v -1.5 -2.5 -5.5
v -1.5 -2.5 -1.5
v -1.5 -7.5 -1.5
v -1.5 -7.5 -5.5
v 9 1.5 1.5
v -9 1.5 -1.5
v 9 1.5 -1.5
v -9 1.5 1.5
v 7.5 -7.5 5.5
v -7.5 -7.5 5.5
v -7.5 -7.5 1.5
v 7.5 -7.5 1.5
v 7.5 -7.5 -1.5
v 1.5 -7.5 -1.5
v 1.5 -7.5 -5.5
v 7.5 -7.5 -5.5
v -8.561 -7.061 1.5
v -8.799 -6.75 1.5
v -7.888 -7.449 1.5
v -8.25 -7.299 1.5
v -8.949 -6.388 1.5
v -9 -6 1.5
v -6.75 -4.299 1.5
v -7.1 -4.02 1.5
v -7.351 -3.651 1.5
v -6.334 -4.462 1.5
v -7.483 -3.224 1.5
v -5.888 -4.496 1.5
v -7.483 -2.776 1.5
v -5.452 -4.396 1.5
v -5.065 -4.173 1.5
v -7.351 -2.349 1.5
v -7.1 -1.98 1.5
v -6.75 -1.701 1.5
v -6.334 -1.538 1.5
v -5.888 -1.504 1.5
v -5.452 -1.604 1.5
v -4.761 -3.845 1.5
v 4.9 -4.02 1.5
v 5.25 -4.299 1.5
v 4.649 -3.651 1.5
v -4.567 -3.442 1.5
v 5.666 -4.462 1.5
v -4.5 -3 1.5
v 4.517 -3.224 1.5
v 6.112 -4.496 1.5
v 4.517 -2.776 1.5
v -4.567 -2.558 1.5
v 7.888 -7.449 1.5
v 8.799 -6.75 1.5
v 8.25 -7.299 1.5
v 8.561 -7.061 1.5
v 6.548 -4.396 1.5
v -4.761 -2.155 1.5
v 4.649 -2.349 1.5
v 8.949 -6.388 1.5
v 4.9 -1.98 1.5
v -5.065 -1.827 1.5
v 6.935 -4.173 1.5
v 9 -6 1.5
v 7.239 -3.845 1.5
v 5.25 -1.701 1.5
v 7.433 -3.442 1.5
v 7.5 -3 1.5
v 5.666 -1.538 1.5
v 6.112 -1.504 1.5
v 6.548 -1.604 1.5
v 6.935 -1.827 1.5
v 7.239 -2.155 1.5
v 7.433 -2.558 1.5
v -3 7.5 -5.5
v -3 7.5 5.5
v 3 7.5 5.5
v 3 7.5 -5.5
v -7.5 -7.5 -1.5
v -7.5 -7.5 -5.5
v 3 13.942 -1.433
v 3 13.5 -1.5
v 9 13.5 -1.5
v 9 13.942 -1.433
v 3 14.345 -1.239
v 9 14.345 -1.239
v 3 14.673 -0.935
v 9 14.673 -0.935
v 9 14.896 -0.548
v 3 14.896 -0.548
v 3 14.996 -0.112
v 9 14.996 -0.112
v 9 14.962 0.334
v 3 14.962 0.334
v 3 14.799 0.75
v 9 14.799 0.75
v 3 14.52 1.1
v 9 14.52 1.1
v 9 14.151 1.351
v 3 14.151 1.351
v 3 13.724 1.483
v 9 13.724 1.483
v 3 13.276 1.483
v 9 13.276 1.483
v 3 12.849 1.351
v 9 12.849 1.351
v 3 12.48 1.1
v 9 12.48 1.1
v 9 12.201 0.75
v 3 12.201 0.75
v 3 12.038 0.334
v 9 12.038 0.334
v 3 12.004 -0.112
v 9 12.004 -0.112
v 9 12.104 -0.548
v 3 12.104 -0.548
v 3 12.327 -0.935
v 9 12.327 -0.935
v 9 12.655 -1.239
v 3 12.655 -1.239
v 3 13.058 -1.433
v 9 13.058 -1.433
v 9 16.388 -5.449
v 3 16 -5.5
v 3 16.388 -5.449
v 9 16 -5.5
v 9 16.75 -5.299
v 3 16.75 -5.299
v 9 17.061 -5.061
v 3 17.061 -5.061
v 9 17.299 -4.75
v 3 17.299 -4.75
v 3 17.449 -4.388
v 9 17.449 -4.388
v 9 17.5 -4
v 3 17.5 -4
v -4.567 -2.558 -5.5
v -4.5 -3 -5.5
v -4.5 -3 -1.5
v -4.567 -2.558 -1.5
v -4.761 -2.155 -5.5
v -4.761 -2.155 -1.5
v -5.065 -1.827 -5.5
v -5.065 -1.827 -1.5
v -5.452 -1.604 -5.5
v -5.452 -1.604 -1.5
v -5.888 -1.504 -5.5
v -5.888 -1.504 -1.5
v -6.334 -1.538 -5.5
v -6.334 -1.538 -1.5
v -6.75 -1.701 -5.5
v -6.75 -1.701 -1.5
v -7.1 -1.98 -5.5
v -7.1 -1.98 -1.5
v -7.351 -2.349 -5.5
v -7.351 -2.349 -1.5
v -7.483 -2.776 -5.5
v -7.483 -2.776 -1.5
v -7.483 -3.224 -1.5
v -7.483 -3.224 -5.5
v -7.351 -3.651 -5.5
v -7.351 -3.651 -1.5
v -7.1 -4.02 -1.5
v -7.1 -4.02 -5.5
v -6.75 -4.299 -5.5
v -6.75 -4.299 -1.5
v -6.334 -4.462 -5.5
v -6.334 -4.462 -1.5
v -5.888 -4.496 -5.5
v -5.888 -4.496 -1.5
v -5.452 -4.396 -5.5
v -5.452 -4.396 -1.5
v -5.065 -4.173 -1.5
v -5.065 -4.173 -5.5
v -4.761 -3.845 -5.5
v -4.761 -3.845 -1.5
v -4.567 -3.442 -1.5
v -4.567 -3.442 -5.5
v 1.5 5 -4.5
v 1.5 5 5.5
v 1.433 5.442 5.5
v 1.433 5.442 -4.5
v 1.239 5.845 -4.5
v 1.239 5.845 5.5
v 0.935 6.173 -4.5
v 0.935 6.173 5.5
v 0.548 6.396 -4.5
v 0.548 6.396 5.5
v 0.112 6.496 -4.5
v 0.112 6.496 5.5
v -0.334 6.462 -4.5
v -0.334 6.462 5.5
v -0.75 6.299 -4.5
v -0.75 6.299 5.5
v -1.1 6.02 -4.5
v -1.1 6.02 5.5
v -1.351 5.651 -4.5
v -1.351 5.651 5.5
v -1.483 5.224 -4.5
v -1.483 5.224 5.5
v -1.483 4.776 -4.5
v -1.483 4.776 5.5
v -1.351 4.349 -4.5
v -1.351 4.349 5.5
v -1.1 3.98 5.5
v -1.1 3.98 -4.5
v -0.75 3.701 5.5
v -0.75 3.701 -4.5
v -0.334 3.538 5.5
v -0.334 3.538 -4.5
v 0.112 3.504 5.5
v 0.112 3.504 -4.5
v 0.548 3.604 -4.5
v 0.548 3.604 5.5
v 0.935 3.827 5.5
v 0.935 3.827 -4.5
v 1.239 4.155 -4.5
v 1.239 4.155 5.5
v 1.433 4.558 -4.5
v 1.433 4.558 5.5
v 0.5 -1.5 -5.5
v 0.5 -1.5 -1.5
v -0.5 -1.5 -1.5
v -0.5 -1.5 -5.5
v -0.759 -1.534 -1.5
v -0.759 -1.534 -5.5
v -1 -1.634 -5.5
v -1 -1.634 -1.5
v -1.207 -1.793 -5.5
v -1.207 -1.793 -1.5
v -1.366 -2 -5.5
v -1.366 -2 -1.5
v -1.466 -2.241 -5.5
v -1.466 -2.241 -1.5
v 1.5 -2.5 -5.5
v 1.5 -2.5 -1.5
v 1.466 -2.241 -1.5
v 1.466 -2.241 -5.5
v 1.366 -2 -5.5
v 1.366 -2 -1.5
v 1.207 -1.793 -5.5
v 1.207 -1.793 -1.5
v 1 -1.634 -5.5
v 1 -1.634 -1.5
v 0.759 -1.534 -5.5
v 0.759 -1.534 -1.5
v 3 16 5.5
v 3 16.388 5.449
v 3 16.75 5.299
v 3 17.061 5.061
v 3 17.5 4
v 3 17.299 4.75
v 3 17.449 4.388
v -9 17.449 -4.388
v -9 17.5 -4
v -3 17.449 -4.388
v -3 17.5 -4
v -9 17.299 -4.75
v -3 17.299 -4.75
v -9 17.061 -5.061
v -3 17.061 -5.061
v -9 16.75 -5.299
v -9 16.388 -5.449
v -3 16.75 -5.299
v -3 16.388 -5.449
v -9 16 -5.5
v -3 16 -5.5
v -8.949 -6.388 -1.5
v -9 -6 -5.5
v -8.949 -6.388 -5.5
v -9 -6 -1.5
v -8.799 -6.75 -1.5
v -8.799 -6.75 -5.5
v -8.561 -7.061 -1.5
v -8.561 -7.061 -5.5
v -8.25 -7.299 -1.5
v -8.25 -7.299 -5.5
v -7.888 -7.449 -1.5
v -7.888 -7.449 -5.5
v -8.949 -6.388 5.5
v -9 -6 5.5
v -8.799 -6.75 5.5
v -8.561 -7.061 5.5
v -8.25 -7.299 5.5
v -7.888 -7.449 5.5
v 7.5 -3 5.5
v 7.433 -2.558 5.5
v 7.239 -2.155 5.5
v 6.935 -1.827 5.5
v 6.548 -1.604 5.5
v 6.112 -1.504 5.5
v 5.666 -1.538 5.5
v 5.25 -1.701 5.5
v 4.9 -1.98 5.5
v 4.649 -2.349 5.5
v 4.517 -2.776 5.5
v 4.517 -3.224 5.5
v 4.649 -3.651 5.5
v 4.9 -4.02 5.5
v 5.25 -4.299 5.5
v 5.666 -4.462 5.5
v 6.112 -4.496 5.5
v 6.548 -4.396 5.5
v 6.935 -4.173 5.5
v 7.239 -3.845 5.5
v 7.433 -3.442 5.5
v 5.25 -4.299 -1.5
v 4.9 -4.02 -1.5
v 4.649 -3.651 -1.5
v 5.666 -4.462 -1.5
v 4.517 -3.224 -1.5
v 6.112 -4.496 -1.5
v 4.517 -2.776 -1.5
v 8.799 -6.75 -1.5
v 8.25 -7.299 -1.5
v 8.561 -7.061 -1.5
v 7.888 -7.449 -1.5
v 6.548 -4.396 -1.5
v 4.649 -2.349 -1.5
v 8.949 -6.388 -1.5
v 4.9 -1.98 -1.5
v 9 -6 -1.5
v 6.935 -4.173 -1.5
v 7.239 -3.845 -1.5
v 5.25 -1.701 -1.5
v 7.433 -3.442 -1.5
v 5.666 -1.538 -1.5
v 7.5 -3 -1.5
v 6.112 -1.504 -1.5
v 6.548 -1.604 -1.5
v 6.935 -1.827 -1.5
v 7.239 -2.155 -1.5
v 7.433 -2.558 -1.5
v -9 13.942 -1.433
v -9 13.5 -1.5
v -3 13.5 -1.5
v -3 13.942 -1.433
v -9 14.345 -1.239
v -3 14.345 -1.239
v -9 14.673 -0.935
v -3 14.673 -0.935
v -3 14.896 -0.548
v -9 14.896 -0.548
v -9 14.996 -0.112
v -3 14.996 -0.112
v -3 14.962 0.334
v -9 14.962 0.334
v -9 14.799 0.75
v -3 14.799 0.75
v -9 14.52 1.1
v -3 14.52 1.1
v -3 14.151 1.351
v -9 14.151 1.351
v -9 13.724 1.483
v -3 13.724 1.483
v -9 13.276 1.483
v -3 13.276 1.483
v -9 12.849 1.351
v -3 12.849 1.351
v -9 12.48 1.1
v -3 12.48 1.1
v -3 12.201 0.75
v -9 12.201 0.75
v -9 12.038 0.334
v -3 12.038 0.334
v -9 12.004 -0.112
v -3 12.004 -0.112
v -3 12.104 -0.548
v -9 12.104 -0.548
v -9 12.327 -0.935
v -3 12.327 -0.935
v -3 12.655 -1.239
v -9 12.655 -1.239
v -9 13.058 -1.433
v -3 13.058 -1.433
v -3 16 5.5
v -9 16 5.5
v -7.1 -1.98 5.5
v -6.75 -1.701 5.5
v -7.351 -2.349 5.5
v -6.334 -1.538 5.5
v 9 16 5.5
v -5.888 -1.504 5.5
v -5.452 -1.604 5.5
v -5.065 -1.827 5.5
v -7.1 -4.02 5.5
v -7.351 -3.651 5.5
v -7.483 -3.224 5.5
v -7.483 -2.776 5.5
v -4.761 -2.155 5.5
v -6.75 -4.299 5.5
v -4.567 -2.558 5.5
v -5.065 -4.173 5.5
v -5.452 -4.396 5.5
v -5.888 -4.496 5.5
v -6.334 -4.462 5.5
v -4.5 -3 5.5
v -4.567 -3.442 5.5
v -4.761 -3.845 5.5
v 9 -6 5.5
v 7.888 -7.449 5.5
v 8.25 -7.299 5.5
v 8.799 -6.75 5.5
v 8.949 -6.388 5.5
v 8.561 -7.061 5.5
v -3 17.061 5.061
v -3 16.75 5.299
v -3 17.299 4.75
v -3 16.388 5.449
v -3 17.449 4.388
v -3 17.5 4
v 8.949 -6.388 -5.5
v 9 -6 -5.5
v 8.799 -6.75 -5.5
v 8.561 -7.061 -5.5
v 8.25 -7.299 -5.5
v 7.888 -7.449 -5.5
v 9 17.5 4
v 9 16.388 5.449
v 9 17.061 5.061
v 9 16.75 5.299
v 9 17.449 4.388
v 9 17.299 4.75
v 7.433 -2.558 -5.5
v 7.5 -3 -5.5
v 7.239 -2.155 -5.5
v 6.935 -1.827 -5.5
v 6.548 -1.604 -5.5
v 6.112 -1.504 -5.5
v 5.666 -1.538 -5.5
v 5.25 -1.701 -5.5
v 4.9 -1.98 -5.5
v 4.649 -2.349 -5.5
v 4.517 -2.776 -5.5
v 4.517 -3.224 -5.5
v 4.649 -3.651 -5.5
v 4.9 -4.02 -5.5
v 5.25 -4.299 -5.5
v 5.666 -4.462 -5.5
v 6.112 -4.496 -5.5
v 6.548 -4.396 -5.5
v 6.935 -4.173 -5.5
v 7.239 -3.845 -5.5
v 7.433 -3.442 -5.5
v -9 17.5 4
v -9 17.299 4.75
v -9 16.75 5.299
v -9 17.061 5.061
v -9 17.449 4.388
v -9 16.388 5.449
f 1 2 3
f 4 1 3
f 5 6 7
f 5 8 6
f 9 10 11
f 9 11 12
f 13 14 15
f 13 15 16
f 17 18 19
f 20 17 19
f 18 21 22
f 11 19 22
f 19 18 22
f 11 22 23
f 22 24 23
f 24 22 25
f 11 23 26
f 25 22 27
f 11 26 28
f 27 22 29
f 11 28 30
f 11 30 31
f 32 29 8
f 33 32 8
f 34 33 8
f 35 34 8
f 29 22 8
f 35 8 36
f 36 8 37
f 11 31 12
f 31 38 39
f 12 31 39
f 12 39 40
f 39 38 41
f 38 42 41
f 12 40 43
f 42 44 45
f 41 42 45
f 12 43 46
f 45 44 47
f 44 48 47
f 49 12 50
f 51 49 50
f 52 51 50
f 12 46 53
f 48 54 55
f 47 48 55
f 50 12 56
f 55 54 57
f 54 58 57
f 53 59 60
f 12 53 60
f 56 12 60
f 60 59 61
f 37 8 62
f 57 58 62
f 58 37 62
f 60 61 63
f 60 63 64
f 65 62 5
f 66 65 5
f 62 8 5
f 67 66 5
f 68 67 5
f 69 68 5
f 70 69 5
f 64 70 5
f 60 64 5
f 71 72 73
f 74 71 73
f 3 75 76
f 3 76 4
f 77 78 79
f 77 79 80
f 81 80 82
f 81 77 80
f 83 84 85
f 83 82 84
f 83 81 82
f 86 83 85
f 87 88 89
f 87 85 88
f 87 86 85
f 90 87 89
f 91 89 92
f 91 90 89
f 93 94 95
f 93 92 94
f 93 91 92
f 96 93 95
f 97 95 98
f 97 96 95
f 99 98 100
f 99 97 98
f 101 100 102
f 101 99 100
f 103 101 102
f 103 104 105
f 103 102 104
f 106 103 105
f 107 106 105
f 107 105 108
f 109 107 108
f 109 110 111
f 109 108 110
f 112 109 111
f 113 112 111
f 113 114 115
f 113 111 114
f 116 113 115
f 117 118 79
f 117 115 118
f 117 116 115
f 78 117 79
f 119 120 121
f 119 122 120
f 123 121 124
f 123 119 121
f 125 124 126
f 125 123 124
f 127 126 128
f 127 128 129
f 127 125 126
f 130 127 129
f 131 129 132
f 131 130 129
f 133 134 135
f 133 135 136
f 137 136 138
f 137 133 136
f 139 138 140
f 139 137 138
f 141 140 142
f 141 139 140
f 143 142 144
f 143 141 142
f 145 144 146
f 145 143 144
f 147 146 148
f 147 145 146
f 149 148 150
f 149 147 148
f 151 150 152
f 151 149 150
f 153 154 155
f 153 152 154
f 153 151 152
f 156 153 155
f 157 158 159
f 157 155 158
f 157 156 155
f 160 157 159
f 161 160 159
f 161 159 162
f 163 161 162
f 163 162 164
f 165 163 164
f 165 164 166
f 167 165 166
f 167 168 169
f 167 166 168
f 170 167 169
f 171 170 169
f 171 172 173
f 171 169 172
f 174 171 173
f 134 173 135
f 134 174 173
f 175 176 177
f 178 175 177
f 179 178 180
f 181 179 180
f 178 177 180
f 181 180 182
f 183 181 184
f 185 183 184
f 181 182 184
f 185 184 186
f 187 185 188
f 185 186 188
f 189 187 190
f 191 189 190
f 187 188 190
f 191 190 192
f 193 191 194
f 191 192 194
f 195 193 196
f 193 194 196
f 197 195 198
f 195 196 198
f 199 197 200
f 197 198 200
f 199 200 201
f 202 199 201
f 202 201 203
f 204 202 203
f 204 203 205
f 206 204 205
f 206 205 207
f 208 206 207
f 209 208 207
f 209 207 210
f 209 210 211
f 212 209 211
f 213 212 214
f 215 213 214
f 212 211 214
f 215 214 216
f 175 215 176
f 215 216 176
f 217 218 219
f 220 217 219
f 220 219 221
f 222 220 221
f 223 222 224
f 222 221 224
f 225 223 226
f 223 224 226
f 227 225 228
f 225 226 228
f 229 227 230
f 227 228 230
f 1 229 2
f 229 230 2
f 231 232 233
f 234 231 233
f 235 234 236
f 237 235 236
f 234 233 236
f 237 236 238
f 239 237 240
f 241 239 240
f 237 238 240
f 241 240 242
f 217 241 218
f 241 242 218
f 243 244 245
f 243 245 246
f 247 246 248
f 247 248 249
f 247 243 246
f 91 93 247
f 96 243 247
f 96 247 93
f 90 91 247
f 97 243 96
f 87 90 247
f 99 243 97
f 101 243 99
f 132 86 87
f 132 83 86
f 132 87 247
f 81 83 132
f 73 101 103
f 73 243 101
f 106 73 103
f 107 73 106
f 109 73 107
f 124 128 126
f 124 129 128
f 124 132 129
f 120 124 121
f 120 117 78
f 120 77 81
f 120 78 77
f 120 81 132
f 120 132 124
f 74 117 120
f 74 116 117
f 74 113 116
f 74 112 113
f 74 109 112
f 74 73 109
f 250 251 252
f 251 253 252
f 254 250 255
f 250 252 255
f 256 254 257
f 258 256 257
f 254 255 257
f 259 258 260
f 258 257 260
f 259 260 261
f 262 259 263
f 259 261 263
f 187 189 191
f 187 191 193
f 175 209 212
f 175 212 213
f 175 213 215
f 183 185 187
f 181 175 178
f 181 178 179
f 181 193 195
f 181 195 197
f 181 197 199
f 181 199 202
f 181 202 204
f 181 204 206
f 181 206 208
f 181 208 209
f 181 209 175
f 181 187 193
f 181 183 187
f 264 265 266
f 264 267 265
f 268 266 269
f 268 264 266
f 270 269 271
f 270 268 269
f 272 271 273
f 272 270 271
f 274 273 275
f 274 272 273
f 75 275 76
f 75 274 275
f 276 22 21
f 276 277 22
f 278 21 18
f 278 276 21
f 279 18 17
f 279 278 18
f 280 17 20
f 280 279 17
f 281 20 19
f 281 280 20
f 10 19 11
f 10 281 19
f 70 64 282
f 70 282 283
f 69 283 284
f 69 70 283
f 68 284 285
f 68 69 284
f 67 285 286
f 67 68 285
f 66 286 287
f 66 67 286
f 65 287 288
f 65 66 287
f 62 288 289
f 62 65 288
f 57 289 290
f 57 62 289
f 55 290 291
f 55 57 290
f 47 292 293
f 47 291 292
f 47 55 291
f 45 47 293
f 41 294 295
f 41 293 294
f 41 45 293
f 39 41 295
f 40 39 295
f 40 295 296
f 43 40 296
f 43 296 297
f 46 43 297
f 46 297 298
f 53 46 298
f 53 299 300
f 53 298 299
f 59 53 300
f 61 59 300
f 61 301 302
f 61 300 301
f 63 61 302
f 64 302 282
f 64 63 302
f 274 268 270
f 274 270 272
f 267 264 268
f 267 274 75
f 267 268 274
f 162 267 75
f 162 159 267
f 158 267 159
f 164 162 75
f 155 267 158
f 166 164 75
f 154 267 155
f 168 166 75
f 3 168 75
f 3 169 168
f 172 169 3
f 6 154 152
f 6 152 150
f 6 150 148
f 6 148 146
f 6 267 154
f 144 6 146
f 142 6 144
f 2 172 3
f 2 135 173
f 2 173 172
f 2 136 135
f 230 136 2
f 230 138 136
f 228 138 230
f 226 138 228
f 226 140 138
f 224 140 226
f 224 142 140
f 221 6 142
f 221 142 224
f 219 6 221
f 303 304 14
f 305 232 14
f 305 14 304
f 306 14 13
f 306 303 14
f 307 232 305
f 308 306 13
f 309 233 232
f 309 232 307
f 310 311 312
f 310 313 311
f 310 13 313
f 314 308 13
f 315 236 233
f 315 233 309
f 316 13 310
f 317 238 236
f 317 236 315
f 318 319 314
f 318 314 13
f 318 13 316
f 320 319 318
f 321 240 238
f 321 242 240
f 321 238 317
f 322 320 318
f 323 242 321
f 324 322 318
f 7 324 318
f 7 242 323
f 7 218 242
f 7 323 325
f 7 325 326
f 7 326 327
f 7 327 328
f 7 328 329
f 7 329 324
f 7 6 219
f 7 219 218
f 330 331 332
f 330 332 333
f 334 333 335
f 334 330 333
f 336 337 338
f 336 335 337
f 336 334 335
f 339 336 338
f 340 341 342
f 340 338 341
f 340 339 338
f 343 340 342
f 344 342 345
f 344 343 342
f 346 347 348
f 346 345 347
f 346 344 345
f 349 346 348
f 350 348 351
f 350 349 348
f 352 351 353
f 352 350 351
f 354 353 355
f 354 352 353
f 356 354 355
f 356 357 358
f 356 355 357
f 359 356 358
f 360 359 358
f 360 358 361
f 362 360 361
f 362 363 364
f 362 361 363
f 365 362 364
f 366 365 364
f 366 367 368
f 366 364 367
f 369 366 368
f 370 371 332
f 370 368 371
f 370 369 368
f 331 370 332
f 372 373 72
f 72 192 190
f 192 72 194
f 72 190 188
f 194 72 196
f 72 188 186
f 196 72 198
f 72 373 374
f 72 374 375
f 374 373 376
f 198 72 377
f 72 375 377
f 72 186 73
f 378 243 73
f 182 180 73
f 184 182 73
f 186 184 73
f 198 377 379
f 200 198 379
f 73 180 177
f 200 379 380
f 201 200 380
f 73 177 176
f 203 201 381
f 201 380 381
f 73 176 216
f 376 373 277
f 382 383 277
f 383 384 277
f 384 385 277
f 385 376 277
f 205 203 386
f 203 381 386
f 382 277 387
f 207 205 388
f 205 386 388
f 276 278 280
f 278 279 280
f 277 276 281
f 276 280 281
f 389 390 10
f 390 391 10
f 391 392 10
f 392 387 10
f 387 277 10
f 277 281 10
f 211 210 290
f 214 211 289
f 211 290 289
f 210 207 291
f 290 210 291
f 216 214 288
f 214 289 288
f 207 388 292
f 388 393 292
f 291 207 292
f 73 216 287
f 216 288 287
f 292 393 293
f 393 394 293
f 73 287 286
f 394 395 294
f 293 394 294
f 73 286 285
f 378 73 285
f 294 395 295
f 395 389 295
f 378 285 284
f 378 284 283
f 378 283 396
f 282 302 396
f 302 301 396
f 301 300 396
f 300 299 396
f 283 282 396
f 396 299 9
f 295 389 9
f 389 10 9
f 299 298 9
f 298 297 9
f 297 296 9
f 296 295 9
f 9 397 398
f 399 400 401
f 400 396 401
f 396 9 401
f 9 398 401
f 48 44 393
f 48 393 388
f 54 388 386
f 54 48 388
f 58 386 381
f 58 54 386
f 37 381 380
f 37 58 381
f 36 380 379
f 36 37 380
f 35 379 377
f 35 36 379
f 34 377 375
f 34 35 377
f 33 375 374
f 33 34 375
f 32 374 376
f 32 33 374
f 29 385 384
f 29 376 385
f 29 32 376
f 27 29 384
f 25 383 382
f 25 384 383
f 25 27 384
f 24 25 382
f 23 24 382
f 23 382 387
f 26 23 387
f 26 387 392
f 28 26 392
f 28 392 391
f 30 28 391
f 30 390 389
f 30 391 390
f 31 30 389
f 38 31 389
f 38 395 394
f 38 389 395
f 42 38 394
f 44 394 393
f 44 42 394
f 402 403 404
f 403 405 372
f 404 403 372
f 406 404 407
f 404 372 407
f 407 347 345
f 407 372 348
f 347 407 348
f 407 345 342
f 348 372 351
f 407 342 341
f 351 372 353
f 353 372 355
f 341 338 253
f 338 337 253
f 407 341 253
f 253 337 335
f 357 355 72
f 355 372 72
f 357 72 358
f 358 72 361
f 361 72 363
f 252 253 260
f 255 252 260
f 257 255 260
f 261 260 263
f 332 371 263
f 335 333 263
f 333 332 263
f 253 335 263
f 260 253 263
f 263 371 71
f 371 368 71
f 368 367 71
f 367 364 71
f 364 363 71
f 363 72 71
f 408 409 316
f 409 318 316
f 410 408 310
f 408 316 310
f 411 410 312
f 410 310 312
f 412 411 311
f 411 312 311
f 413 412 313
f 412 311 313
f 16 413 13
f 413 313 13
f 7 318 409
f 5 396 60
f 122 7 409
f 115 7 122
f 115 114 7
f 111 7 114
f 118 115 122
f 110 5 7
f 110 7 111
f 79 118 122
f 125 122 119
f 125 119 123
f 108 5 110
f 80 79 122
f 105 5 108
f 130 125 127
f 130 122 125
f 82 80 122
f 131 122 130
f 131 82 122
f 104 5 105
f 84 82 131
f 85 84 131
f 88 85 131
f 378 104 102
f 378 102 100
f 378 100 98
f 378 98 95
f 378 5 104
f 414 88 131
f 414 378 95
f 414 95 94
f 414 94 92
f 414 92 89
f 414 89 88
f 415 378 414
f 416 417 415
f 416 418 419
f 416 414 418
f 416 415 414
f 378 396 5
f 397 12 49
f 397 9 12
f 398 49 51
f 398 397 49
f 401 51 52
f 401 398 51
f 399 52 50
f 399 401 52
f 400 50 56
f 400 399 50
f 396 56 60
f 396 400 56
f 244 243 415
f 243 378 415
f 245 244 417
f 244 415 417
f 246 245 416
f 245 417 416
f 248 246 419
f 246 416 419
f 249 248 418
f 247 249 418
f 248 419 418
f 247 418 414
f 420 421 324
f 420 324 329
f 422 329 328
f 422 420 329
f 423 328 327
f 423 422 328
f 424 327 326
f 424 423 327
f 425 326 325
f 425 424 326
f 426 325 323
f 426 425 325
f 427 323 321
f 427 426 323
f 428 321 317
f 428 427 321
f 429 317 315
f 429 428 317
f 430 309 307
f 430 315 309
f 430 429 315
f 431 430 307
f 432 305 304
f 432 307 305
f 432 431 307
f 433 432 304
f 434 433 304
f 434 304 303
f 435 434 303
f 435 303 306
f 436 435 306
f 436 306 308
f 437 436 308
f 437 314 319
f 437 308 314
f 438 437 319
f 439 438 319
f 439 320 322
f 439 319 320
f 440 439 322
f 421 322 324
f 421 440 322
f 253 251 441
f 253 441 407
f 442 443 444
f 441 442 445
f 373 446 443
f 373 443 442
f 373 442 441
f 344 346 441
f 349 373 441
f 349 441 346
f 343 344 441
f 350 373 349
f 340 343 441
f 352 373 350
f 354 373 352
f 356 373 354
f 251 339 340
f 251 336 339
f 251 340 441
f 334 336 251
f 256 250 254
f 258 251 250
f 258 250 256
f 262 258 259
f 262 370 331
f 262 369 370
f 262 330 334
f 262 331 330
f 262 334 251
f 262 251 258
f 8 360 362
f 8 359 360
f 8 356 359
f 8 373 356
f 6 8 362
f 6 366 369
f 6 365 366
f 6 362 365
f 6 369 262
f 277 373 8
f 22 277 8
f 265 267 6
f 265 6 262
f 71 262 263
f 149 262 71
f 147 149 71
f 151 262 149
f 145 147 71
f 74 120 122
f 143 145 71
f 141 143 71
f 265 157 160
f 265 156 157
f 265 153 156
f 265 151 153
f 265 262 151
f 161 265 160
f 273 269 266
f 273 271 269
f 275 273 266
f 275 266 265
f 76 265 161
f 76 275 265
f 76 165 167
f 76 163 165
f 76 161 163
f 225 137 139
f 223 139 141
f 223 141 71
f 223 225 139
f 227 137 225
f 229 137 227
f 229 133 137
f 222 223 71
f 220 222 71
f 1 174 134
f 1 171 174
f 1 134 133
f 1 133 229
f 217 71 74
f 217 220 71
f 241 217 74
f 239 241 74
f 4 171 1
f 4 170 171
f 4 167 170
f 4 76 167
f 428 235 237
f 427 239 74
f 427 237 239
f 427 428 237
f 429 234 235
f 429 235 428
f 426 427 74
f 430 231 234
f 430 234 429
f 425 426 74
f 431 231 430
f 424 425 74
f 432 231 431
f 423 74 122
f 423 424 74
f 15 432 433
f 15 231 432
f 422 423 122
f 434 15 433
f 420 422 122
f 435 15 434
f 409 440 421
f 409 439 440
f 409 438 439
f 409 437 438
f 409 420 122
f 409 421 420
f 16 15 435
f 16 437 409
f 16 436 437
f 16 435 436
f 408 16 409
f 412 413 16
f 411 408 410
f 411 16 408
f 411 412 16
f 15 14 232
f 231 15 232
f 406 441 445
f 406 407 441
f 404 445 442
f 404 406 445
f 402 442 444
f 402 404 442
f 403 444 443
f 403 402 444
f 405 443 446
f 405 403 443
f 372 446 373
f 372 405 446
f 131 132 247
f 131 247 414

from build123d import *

# Parameters (mm, degrees)
CROQUIS2_W                 = 18
CROQUIS2_H                 = 15
SALIENTE_EXTRUIR1_DEPTH    = 5.5
CROQUIS3_W                 = 18
CROQUIS3_H                 = 9
CORTAR_EXTRUIR1_DEPTH      = 1.5
CORTAR_EXTRUIR2_DEPTH      = 13.942179106
CROQUIS10_W                = 6
CROQUIS10_H                = 11
SALIENTE_EXTRUIR4_DEPTH    = 10
CORTAR_EXTRUIR3_DEPTH      = 21.432816742
CORTAR_EXTRUIR3_DEPTH_BACK = 21.432816742
CROQUIS7_R                 = 1.5
CORTAR_EXTRUIR4_DEPTH      = 21.432816742
CORTAR_EXTRUIR4_DEPTH_BACK = 21.432816742
CROQUIS11_R                = 1.5
REDONDEO2_R                = 1.5
REDONDEO3_R                = 1.5
CROQUIS15_R                = 1.5
CORTAR_EXTRUIR7_DEPTH      = 10


with BuildPart() as part:
    # Croquis2 → Saliente-Extruir1 (new, symmetric)
    with BuildSketch(Plane.XY):
        Rectangle(CROQUIS2_W, CROQUIS2_H)
    extrude(amount=SALIENTE_EXTRUIR1_DEPTH, both=True)

    # Croquis3 → Cortar-Extruir1 (cut, symmetric)
    with BuildSketch(Plane.XY):
        with Locations((0, -3)):
            Rectangle(CROQUIS3_W, CROQUIS3_H)
    extrude(amount=CORTAR_EXTRUIR1_DEPTH, both=True, mode=Mode.SUBTRACT)

    # Croquis4 → Cortar-Extruir2 (cut, through all)
    with BuildSketch(Plane.XY):
        with BuildLine():
            Line((0.5, -1.5), (-0.5, -1.5))
            ThreePointArc((-0.5, -1.5), (-1.207106781, -1.792893219), (-1.5, -2.5))
            Line((-1.5, -2.5), (-1.5, -3))
            Line((-1.5, -3), (-1.5, -7.5))
            Line((-1.5, -7.5), (1.5, -7.5))
            Line((1.5, -7.5), (1.5, -3))
            Line((1.5, -3), (1.5, -2.5))
            ThreePointArc((1.5, -2.5), (1.207106781, -1.792893219), (0.5, -1.5))
        make_face()
    extrude(amount=-CORTAR_EXTRUIR2_DEPTH, mode=Mode.SUBTRACT)

    # Croquis10 → Saliente-Extruir4 (add)
    with BuildSketch(Plane(origin=(0, 7.5, 0), x_dir=(1, 0, 0), z_dir=(0, 1, 0))):
        with Locations((-6, 0)):
            Rectangle(CROQUIS10_W, CROQUIS10_H)
        with Locations((6, 0)):
            Rectangle(CROQUIS10_W, CROQUIS10_H)
    extrude(amount=SALIENTE_EXTRUIR4_DEPTH)

    # Croquis7 → Cortar-Extruir3 (cut, two sides: drawn at the far end of the back side and taken through both)
    with BuildSketch(Plane(origin=(0, 0, 0), x_dir=(0, 0, -1), z_dir=(1, 0, 0)).offset(-CORTAR_EXTRUIR3_DEPTH_BACK)):
        with Locations((0, 13.5)):
            Circle(CROQUIS7_R)
    extrude(amount=CORTAR_EXTRUIR3_DEPTH + CORTAR_EXTRUIR3_DEPTH_BACK, mode=Mode.SUBTRACT)

    # Croquis11 → Cortar-Extruir4 (cut, two sides: drawn at the far end of the back side and taken through both)
    with BuildSketch(Plane.XY.offset(-CORTAR_EXTRUIR4_DEPTH_BACK)):
        with Locations((6, -3)):
            Circle(CROQUIS11_R)
        with Locations((-6, -3)):
            Circle(CROQUIS11_R)
    extrude(amount=CORTAR_EXTRUIR4_DEPTH + CORTAR_EXTRUIR4_DEPTH_BACK, mode=Mode.SUBTRACT)

    # Redondeo2
    redondeo2_edges = [part.edges().sort_by_distance(p)[0] for p in [
        (6, 17.5, -5.5),
        (6, 17.5, 5.5),
        (-6, 17.5, 5.5),
        (-6, 17.5, -5.5),
    ]]
    fillet(redondeo2_edges, radius=REDONDEO2_R)

    # Redondeo3
    redondeo3_edges = [part.edges().sort_by_distance(p)[0] for p in [
        (9, -7.5, -3.5),
        (-9, -7.5, -3.5),
        (9, -7.5, 3.5),
        (-9, -7.5, 3.5),
    ]]
    fillet(redondeo3_edges, radius=REDONDEO3_R)

    # Croquis15 → Cortar-Extruir7 (cut)
    with BuildSketch(Plane.XY.offset(5.5)):
        with Locations((0, 5)):
            Circle(CROQUIS15_R)
    extrude(amount=-CORTAR_EXTRUIR7_DEPTH, mode=Mode.SUBTRACT)


solid = part.part
